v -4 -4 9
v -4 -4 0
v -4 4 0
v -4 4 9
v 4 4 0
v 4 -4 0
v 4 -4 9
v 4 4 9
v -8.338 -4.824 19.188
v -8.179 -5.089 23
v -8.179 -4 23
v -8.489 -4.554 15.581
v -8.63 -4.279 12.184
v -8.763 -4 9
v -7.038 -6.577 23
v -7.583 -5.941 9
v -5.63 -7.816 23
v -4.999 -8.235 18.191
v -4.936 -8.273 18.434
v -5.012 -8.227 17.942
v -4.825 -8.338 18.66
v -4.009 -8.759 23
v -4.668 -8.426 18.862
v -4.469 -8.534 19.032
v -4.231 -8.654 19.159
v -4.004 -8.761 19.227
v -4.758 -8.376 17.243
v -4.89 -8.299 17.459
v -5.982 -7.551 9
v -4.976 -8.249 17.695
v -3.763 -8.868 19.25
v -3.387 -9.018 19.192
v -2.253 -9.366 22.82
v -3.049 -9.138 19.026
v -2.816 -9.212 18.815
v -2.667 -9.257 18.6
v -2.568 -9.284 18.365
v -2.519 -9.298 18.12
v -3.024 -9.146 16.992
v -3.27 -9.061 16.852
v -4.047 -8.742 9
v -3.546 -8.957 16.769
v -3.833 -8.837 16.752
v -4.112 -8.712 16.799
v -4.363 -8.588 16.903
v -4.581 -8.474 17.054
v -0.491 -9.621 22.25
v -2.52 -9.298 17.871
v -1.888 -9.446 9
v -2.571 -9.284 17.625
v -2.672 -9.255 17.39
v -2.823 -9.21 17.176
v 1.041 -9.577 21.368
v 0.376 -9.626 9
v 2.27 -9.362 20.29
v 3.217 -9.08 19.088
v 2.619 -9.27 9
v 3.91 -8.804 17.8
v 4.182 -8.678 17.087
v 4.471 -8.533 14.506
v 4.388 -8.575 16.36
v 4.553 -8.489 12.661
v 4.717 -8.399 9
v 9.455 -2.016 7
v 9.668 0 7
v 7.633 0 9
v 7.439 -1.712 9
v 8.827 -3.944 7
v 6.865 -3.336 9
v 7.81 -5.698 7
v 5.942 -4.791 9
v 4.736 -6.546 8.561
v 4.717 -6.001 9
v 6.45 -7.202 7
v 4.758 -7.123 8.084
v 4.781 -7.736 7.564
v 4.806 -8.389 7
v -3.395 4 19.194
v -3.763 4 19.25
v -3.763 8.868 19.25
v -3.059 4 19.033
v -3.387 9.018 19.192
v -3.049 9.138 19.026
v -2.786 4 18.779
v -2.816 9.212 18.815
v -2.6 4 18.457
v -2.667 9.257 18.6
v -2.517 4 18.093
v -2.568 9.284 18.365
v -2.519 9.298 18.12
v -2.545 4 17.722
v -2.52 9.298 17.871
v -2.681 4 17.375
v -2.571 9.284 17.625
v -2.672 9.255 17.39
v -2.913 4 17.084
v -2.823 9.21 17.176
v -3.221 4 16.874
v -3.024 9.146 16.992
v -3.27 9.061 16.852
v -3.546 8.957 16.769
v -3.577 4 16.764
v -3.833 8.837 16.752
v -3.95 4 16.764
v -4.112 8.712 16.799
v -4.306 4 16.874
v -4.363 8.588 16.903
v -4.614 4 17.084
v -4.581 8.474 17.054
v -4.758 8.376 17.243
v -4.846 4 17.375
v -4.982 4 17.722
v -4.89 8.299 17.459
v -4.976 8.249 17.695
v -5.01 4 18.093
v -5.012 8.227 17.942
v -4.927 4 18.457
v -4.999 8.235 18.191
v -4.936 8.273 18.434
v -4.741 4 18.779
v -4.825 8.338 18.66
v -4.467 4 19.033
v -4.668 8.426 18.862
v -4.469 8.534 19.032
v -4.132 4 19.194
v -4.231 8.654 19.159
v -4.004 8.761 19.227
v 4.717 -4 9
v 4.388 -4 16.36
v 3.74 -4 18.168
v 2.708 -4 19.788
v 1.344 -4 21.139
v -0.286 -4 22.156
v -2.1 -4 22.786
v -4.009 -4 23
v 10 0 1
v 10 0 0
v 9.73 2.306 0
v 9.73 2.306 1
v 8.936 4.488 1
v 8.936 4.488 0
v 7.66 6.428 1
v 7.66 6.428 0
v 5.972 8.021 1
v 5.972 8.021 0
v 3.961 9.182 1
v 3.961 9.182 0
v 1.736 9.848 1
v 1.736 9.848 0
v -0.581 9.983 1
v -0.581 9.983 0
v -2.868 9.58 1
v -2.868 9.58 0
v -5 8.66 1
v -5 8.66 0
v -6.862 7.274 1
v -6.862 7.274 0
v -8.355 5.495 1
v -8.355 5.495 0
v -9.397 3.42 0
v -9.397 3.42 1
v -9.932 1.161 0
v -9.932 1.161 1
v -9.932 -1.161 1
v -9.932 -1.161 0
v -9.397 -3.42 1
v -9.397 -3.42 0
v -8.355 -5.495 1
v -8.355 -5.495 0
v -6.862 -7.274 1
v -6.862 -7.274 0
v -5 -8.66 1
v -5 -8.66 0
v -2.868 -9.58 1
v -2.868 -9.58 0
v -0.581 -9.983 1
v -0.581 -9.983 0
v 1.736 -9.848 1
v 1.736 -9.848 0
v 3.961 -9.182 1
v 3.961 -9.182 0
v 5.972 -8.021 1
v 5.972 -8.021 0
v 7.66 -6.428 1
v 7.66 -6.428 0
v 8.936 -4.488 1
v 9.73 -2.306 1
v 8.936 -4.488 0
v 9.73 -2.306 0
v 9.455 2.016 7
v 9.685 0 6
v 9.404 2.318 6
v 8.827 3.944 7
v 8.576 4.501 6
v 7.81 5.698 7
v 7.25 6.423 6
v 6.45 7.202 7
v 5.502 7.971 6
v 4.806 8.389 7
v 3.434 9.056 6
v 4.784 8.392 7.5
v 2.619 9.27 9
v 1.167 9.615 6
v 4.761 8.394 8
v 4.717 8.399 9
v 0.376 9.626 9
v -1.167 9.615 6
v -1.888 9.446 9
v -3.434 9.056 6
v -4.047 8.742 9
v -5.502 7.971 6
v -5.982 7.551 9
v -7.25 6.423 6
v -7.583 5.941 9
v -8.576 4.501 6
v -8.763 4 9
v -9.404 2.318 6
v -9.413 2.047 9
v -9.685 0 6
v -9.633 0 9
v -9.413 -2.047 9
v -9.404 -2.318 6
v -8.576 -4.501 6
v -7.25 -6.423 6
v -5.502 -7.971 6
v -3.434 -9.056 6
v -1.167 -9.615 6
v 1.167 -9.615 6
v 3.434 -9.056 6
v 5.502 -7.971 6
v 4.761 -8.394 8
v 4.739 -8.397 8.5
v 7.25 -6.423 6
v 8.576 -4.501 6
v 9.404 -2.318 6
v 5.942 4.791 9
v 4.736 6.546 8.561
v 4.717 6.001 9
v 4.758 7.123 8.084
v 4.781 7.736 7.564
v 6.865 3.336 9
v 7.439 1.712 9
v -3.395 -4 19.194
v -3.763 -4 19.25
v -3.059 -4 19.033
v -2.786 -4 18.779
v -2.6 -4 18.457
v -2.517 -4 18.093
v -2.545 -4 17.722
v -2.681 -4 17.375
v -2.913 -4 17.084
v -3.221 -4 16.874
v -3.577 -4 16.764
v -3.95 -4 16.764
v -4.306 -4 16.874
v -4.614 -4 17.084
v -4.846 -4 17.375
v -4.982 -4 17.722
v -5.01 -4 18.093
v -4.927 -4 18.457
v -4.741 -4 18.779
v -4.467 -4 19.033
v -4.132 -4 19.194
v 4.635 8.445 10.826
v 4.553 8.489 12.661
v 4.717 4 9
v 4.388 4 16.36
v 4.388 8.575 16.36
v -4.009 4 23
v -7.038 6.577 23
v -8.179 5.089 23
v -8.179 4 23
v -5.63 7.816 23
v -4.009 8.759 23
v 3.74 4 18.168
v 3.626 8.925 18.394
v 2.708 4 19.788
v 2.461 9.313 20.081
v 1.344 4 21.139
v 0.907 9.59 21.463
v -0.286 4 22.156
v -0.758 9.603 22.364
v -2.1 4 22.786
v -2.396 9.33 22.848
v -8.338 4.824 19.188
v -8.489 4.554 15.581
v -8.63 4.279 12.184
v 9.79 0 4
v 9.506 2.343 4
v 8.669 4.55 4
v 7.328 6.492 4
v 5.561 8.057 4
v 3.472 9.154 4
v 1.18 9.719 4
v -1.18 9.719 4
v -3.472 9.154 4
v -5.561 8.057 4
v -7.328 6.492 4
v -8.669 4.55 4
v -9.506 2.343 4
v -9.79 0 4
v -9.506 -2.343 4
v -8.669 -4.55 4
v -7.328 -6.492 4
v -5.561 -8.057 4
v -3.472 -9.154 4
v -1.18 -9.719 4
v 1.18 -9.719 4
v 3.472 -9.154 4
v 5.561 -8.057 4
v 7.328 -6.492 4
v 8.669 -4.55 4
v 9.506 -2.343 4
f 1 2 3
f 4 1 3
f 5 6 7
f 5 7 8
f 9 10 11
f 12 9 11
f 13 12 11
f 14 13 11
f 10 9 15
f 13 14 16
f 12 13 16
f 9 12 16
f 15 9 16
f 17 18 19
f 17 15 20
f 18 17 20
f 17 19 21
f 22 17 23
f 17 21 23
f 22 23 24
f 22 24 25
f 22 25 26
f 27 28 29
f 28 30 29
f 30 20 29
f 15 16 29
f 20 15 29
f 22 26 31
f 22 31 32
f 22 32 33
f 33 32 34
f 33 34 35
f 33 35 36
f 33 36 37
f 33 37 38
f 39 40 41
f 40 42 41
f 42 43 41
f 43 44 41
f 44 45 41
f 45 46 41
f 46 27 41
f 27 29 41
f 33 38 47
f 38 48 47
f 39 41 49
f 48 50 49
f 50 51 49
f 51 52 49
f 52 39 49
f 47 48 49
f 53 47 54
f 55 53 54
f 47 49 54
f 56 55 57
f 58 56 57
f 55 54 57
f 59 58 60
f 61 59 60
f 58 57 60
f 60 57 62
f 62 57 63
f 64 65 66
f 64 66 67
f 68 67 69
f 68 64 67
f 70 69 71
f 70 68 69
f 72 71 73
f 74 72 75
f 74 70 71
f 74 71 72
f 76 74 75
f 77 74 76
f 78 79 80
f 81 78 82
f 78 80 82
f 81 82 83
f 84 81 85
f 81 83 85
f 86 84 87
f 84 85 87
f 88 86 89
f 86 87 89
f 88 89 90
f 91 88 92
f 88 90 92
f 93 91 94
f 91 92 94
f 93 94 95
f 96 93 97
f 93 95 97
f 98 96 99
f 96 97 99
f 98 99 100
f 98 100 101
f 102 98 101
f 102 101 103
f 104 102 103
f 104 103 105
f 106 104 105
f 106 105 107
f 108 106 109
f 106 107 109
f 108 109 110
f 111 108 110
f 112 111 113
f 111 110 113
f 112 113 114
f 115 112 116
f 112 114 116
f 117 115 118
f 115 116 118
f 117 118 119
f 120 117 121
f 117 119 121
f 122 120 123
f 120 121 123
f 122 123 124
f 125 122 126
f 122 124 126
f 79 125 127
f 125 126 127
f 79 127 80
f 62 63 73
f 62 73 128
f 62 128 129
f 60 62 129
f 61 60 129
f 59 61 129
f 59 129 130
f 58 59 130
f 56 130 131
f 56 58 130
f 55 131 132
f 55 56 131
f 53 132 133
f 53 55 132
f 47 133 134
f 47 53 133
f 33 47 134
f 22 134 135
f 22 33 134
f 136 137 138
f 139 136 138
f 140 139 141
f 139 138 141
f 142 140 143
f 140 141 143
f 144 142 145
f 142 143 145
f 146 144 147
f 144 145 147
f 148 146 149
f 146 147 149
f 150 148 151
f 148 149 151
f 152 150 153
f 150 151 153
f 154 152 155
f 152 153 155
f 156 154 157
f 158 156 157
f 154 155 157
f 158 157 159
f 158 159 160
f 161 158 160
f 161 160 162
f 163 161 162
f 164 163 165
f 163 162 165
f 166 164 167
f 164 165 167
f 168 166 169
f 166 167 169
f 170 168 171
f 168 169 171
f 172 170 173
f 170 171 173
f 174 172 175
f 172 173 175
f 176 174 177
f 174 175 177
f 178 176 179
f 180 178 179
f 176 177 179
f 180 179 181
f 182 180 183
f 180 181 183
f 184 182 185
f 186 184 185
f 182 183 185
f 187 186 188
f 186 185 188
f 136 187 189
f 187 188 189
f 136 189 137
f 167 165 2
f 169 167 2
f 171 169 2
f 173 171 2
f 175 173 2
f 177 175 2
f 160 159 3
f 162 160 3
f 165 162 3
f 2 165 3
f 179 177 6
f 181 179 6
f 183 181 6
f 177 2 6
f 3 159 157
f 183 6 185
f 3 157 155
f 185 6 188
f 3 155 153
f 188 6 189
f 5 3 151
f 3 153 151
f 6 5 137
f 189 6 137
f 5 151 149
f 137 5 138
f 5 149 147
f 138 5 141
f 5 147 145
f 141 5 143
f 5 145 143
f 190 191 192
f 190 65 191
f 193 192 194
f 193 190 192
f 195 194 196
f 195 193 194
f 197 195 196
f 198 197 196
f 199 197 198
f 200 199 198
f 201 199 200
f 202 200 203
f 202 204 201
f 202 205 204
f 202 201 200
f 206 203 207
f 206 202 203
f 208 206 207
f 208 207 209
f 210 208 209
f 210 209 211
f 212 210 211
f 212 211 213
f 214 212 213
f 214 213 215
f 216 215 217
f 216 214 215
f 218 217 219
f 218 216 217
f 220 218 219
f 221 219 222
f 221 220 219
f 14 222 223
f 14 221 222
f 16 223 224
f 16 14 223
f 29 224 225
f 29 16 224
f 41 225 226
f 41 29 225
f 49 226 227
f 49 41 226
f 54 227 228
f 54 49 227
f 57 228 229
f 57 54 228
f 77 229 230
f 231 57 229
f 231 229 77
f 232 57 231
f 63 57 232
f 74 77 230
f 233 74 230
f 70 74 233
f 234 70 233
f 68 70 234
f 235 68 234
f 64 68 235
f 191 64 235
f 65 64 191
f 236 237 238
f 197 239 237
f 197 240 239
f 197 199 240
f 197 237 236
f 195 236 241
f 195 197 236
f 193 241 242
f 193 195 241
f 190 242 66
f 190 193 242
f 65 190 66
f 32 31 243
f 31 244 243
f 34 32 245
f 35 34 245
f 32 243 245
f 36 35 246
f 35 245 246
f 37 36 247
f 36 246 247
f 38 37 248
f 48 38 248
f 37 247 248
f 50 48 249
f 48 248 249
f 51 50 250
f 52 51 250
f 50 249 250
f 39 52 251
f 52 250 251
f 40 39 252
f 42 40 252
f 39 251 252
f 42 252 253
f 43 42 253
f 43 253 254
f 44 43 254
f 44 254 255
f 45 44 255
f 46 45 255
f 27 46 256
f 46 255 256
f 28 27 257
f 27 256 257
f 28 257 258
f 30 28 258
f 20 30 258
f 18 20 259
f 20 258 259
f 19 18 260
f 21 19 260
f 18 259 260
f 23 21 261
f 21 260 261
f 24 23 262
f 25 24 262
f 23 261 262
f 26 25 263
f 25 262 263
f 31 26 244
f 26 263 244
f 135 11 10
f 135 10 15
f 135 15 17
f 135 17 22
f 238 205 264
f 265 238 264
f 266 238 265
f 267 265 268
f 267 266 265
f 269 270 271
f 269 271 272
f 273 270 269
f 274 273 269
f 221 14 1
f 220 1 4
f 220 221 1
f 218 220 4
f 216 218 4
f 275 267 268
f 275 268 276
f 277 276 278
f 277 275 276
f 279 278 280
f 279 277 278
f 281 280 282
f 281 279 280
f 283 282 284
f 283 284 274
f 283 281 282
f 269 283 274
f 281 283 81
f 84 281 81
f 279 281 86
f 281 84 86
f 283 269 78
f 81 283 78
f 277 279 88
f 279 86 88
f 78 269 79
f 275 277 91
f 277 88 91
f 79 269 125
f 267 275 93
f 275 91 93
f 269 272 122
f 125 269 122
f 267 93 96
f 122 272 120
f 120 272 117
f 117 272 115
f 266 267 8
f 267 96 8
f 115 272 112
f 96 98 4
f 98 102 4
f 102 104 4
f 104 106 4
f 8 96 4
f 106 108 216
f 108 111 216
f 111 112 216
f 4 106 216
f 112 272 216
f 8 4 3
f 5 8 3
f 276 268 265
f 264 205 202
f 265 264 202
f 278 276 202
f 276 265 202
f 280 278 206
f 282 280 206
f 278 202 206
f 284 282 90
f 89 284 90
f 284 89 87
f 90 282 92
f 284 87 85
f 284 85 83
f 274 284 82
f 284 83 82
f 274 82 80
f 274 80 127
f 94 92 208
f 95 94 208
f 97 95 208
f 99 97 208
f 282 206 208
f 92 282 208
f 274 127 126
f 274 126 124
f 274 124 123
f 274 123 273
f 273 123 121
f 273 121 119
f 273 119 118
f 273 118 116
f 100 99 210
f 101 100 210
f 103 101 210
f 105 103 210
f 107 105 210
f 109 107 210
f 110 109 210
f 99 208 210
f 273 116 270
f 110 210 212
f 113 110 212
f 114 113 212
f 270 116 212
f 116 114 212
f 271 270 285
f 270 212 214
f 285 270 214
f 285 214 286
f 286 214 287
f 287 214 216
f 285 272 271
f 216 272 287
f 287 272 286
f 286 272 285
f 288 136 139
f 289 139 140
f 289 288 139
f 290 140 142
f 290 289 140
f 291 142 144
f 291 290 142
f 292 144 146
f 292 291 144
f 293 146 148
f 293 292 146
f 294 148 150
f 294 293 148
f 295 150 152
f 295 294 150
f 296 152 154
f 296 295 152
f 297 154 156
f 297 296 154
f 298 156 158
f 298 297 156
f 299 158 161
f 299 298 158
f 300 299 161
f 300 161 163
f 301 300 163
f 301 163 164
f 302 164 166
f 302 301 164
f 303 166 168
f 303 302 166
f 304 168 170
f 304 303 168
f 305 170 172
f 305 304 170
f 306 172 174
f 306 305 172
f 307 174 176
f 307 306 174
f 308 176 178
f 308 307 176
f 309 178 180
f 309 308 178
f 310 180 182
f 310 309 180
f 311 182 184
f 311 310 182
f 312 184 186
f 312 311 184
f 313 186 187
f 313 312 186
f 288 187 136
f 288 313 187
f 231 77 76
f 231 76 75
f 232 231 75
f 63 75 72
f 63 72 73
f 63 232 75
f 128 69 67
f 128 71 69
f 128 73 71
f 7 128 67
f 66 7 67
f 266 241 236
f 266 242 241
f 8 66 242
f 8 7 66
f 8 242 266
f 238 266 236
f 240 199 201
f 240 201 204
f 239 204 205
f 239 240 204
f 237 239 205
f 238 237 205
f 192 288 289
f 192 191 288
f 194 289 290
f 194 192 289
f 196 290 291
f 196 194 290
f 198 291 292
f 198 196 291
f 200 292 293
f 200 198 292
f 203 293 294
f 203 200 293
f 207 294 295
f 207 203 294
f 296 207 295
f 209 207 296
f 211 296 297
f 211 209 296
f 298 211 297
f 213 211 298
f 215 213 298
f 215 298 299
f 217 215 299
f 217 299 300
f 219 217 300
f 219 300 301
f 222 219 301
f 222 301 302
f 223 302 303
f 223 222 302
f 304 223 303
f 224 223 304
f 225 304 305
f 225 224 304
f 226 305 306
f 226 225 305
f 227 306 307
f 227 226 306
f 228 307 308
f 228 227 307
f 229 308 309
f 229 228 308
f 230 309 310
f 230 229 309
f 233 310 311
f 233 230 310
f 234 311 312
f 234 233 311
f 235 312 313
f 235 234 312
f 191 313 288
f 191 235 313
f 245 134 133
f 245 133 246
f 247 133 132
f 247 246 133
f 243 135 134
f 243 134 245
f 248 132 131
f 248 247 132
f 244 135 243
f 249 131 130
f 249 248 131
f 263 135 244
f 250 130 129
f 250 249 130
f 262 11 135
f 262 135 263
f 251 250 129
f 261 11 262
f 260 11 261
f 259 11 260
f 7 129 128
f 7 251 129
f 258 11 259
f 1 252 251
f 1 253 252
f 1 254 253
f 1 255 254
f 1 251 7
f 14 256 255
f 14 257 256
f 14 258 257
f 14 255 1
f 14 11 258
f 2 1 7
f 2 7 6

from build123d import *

# Parameters (mm, degrees)
SKETCH1_R               = 10
BOSS_EXTRUDE1_DEPTH     = 1
SKETCH2_R               = 10
BOSS_EXTRUDE2_DEPTH     = 3
BOSS_EXTRUDE2_TAPER     = 4
SKETCH3_R               = 9.790219564
BOSS_EXTRUDE3_DEPTH     = 2
BOSS_EXTRUDE3_TAPER     = 3
SKETCH4_R               = 9.685404006
BOSS_EXTRUDE4_DEPTH     = 3
BOSS_EXTRUDE4_TAPER     = 1
SKETCH5_R               = 9.633038811
BOSS_EXTRUDE5_DEPTH     = 14
CUT_EXTRUDE1_DEPTH      = 13
CUT_EXTRUDE1_DEPTH_BACK = 13
SKETCH6_W               = 17.15
SKETCH6_H               = 8
CUT_EXTRUDE2_DEPTH      = 13
CUT_EXTRUDE2_DEPTH_BACK = 13
SKETCH8_W               = 8
SKETCH8_H               = 8
CUT_EXTRUDE3_DEPTH      = 13
SKETCH9_R               = 1.25
CUT_EXTRUDE4_DEPTH      = 11
CHAMFER1_SIZE           = 2


with BuildPart() as part:
    # Sketch1 → Boss-Extrude1 (new body)
    with BuildSketch(Plane.XY):
        Circle(SKETCH1_R)
    extrude(amount=BOSS_EXTRUDE1_DEPTH)

    # Sketch2 → Boss-Extrude2 (add)
    with BuildSketch(Plane.XY.offset(1)):
        Circle(SKETCH2_R)
    extrude(amount=BOSS_EXTRUDE2_DEPTH, taper=BOSS_EXTRUDE2_TAPER)

    # Sketch3 → Boss-Extrude3 (add)
    with BuildSketch(Plane.XY.offset(4)):
        Circle(SKETCH3_R)
    extrude(amount=BOSS_EXTRUDE3_DEPTH, taper=BOSS_EXTRUDE3_TAPER)

    # Sketch4 → Boss-Extrude4 (add)
    with BuildSketch(Plane.XY.offset(6)):
        Circle(SKETCH4_R)
    extrude(amount=BOSS_EXTRUDE4_DEPTH, taper=BOSS_EXTRUDE4_TAPER)

    # Sketch5 → Boss-Extrude5 (add)
    with BuildSketch(Plane.XY.offset(9)):
        Circle(SKETCH5_R)
    extrude(amount=BOSS_EXTRUDE5_DEPTH)

    # Sketch6 → Cut-Extrude1 (cut, two sides: drawn at the far end of the back side and taken through both)
    with BuildSketch(Plane(origin=(0, 0, 0), x_dir=(0, 0, -1), z_dir=(1, 0, 0)).offset(-CUT_EXTRUDE1_DEPTH_BACK)):
        with Locations((-17.575, 0)):
            Rectangle(SKETCH6_W, SKETCH6_H)
    extrude(amount=CUT_EXTRUDE1_DEPTH + CUT_EXTRUDE1_DEPTH_BACK, mode=Mode.SUBTRACT)

    # Sketch7 → Cut-Extrude2 (cut, two sides: drawn at the far end of the back side and taken through both)
    with BuildSketch(Plane(origin=(0, 0, 0), x_dir=(1, 0, 0), z_dir=(0, 1, 0)).offset(-CUT_EXTRUDE2_DEPTH_BACK)):
        with BuildLine():
            Line((-8.763300561, -9), (-10.263300561, -9))
            Line((-10.263300561, -9), (-10.263300561, -28.451581468))
            Line((-10.263300561, -28.451581468), (9.633038811, -28.451581468))
            Line((9.633038811, -28.451581468), (9.633038811, -9))
            Line((9.633038811, -9), (4.716699439, -9))
            Line((4.716699439, -9), (4.388453733, -16.36))
            ThreePointArc((4.388453733, -16.36), (1.343744491, -21.139438677), (-4.008974444, -23))
            Line((-4.008974444, -23), (-8.178974444, -23))
            Line((-8.178974444, -23), (-8.763300561, -9))
        make_face()
    extrude(amount=CUT_EXTRUDE2_DEPTH + CUT_EXTRUDE2_DEPTH_BACK, mode=Mode.SUBTRACT)

    # Sketch8 → Cut-Extrude3 (cut)
    with BuildSketch(Plane(origin=(0, 0, 0), x_dir=(-1, 0, 0), z_dir=(0, 0, -1))):
        Rectangle(SKETCH8_W, SKETCH8_H)
    extrude(amount=-CUT_EXTRUDE3_DEPTH, mode=Mode.SUBTRACT)

    # Sketch9 → Cut-Extrude4 (cut, symmetric)
    with BuildSketch(Plane(origin=(0, 0, 0), x_dir=(1, 0, 0), z_dir=(0, 1, 0))):
        with Locations(Location((-3.763300561, -18, 0), (0, 0, 270))):
            Circle(SKETCH9_R)
    extrude(amount=CUT_EXTRUDE4_DEPTH, both=True, mode=Mode.SUBTRACT)

    # Chamfer1
    # the kernel refuses this chamfer: 2 mm, written as the material it takes off along each edge
    with BuildSketch(Plane(origin=(0, 0, 9), x_dir=(-0.022475112384337453, 0.9997474027589727, 0), z_dir=(-0.9997474027589727, -0.022475112384337453, 0))) as chamfer1_piece_1_section:
        Polygon((9.633038811 - CHAMFER1_SIZE, 0), (9.633038811 + CHAMFER1_SIZE * 0.0174524064372, CHAMFER1_SIZE * 0.999847695156), (9.633038811, 0), align=None)
    chamfer1_piece_1 = revolve(axis=Axis((0, 0, 9), (0, 0, -1)), revolution_arc=91.28783752, mode=Mode.PRIVATE)
    chamfer1_piece_1 = split(chamfer1_piece_1, bisect_by=Plane(origin=(4.752278324, 4.191519128, 8.202242122), z_dir=(0.9990069635270563, 0, 0.0445543131969368)), keep=Keep.TOP, mode=Mode.PRIVATE)
    add(chamfer1_piece_1, mode=Mode.SUBTRACT)
    with BuildSketch(Plane(origin=(0, 0, 9), x_dir=(1, 0, 0), z_dir=(0, 1, 0))) as chamfer1_piece_2_section:
        Polygon((9.633038811 - CHAMFER1_SIZE, 0), (9.633038811 + CHAMFER1_SIZE * 0.0174524064373, CHAMFER1_SIZE * 0.999847695156), (9.633038811, 0), align=None)
    chamfer1_piece_2 = revolve(axis=Axis((0, 0, 9), (0, 0, -1)), revolution_arc=91.28783752, mode=Mode.PRIVATE)
    chamfer1_piece_2 = split(chamfer1_piece_2, bisect_by=Plane(origin=(4.752278326, -4.191519128, 8.202242073), z_dir=(0.9990069635270563, 0, 0.0445543131969368)), keep=Keep.TOP, mode=Mode.PRIVATE)
    add(chamfer1_piece_2, mode=Mode.SUBTRACT)


solid = part.part
